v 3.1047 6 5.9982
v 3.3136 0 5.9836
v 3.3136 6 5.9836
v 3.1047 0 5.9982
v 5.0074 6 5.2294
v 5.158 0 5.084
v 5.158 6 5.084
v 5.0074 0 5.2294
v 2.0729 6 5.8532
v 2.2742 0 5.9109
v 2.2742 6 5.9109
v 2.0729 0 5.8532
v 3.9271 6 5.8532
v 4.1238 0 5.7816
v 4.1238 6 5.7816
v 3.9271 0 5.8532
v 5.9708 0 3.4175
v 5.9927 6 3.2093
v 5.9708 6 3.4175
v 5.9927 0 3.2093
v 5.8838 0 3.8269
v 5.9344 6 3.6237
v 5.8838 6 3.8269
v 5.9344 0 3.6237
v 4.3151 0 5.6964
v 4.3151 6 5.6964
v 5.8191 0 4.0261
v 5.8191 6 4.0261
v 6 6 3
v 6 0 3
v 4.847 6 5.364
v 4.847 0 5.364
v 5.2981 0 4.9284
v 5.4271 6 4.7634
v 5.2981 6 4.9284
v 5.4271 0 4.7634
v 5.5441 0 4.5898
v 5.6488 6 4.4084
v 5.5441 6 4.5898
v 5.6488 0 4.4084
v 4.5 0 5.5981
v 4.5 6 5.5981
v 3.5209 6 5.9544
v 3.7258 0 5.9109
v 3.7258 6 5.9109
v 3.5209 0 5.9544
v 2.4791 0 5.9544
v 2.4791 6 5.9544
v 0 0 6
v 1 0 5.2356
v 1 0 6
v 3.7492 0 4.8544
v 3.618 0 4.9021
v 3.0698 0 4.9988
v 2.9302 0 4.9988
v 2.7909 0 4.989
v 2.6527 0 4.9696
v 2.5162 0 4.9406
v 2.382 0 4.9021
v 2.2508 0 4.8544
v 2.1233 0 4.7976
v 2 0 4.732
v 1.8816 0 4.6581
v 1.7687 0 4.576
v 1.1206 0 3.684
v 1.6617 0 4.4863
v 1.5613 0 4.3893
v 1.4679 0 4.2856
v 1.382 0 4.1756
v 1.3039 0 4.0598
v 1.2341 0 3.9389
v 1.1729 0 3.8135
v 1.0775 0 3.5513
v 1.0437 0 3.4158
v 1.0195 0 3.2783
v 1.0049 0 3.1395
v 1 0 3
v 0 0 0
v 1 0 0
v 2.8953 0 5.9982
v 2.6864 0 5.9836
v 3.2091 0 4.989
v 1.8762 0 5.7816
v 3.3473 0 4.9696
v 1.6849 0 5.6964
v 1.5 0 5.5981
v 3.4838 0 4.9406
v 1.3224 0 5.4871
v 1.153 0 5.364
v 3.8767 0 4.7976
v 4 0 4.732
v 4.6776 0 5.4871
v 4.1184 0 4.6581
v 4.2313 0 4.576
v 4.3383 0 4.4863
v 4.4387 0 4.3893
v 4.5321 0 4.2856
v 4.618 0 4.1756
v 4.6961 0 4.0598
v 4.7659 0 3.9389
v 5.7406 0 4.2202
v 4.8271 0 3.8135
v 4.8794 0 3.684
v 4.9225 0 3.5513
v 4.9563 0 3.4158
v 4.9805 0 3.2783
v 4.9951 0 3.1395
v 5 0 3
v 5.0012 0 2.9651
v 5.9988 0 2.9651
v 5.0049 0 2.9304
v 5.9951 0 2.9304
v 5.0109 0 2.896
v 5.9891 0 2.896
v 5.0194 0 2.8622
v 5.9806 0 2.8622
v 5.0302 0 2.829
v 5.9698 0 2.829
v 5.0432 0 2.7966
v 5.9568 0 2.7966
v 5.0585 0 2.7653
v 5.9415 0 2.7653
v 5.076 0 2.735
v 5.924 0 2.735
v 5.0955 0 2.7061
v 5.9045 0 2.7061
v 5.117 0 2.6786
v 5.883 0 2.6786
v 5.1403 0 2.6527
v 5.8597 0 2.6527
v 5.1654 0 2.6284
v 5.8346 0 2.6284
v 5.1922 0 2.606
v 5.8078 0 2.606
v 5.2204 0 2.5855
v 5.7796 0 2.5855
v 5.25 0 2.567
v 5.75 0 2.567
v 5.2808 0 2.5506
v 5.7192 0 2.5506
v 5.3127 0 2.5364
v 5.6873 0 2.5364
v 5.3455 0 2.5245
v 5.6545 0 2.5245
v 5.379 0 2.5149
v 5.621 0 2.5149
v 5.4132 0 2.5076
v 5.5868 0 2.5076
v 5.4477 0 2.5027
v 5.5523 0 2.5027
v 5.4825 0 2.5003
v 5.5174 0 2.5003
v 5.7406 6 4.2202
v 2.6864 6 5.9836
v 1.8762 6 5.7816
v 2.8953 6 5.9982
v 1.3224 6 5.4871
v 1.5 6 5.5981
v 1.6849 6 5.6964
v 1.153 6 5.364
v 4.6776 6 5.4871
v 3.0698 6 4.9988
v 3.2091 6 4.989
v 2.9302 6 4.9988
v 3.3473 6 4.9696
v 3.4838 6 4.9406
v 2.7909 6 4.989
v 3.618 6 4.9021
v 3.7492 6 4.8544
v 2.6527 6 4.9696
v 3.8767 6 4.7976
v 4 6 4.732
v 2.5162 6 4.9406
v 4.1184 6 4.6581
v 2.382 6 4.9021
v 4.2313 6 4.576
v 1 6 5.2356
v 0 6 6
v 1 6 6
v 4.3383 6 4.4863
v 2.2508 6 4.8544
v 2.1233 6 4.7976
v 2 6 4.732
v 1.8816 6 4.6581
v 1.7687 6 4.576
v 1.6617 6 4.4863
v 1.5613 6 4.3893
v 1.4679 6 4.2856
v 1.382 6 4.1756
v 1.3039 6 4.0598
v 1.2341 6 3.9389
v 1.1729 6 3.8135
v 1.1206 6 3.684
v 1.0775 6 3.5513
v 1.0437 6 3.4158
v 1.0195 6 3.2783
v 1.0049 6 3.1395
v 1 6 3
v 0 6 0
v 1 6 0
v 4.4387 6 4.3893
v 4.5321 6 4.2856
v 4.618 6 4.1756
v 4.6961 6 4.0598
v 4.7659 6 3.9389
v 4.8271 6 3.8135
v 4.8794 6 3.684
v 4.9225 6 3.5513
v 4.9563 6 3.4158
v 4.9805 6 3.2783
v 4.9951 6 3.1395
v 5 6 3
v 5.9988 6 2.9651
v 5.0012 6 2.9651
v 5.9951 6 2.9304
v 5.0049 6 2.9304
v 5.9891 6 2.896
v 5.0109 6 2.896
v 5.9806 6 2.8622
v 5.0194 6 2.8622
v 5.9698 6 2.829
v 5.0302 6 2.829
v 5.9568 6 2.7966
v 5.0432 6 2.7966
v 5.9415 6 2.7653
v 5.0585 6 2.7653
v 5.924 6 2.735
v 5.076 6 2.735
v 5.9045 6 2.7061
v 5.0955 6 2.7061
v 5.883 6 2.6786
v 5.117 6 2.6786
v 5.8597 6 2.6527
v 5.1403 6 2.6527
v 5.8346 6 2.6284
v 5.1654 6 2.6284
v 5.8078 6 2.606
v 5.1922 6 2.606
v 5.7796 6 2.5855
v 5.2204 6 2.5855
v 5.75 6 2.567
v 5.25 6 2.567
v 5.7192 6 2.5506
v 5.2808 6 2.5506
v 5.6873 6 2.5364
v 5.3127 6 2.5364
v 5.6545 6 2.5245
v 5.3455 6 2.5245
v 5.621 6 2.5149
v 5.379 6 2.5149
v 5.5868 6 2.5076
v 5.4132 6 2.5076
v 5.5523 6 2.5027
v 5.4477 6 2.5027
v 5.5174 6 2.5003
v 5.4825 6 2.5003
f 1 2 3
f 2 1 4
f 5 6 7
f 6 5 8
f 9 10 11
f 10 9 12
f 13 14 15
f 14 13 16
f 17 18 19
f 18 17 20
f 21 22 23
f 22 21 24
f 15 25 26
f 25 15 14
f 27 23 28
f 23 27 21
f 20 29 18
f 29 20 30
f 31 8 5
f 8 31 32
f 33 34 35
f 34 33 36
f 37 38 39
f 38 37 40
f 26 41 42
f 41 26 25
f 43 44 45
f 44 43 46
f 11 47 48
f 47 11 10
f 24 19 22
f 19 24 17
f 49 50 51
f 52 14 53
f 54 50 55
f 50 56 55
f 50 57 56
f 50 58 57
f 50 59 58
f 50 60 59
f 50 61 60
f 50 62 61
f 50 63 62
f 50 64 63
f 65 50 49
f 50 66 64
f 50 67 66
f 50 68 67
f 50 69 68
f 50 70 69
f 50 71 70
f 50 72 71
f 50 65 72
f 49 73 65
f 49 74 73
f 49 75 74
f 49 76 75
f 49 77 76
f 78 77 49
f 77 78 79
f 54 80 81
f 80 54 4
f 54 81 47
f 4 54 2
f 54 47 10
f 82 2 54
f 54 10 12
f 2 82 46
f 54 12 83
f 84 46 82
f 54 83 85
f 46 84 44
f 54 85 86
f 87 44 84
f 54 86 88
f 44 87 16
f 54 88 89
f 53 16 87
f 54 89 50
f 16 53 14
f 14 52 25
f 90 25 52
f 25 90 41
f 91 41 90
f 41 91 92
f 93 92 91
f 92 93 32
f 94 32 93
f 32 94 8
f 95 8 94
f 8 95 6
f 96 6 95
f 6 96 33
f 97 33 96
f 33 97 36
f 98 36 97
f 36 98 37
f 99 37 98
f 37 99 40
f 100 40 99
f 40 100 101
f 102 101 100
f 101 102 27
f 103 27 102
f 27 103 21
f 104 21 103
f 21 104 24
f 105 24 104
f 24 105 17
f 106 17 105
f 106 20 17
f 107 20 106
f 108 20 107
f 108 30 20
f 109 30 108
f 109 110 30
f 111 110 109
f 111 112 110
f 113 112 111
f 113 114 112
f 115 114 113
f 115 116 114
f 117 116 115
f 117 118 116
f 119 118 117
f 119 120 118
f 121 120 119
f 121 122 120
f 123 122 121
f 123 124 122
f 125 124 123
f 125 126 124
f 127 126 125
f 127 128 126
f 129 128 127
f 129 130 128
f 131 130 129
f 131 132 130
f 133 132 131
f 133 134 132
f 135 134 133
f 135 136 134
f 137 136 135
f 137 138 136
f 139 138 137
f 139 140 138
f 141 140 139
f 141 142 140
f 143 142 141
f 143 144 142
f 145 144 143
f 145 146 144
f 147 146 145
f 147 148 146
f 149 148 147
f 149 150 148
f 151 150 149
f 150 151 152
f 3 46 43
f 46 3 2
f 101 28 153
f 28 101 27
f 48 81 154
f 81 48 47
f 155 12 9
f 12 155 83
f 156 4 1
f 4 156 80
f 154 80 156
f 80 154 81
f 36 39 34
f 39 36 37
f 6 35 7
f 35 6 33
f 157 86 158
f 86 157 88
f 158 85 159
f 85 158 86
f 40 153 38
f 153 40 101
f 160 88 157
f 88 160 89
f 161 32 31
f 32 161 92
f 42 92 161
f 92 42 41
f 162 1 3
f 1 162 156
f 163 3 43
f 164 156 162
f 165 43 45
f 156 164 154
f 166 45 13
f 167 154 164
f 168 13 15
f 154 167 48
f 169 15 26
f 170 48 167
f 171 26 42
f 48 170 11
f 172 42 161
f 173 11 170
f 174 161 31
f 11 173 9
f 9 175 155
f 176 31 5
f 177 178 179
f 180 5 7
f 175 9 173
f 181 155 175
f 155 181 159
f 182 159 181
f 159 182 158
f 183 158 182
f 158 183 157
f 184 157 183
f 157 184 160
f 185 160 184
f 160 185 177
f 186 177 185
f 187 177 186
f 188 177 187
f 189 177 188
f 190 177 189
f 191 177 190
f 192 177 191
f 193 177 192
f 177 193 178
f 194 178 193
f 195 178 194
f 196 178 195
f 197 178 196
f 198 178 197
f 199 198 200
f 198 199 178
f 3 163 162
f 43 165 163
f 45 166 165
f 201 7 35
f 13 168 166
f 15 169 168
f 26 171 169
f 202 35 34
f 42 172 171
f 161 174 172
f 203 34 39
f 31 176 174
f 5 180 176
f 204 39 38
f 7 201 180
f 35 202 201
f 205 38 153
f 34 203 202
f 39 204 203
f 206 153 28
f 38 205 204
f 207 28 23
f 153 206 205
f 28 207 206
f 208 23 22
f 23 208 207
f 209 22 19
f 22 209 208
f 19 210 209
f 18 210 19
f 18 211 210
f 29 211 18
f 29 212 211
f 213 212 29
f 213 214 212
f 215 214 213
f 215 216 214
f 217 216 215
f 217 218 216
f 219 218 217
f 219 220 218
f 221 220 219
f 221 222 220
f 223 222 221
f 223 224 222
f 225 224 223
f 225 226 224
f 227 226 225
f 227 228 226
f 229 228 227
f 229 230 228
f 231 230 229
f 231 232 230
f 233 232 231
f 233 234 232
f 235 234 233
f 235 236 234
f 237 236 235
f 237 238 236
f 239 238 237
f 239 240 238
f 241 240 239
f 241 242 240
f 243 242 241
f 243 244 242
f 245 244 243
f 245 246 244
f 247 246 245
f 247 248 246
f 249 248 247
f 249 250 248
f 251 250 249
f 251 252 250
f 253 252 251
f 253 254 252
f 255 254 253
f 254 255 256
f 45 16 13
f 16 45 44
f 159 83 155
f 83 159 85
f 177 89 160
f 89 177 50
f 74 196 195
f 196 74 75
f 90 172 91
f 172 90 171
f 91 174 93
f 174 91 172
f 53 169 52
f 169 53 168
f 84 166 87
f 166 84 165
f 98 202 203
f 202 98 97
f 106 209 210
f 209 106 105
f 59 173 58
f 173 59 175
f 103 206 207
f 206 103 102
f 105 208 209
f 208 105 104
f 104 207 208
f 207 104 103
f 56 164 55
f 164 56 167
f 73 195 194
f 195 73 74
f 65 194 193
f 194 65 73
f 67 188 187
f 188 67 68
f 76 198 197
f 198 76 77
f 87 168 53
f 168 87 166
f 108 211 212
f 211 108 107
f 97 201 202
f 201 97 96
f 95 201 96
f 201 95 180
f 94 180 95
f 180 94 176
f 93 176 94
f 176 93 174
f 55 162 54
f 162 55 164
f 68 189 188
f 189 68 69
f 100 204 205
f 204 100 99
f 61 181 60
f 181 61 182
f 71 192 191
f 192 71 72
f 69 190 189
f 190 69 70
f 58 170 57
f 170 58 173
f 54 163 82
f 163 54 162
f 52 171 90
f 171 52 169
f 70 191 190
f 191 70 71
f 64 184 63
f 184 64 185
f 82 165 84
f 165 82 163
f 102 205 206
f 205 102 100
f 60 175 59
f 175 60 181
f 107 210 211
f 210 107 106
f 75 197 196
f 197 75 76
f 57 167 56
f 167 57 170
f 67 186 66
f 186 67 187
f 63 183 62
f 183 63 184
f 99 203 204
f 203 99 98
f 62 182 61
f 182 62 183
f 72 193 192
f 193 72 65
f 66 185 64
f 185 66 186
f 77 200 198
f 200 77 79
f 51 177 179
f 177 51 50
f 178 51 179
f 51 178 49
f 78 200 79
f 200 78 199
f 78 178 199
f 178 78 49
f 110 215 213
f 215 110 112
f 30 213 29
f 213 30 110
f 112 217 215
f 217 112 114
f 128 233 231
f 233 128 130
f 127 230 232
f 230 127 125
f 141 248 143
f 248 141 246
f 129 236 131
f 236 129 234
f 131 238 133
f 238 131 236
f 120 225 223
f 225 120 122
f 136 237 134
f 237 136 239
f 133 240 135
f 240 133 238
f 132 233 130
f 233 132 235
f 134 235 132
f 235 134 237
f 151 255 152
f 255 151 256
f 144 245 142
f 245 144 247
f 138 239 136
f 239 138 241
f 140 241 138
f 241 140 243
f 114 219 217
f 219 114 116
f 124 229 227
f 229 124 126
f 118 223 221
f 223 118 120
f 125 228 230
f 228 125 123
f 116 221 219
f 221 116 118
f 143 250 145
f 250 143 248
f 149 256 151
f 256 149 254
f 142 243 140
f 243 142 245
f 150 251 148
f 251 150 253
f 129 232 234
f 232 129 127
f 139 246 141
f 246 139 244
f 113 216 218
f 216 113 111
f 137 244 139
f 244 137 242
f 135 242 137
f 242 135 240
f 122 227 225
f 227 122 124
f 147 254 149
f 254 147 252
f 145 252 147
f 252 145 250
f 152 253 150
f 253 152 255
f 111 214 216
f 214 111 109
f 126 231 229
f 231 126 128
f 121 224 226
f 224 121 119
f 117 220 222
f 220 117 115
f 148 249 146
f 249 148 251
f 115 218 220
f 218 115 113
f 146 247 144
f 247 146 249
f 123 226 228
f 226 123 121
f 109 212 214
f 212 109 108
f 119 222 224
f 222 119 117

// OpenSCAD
$fn = 90;

M = 100;

LED_STRIP_T = 6;
GAP = 5;

BASE_T = 1;
BASE_H = LED_STRIP_T;
BASE_W = BASE_H;

module hook() {
    cube([BASE_T, BASE_W, BASE_H]);
    translate([BASE_H/2,0, BASE_H/2])rotate([-90,0,0])
        difference() {
            cylinder(d=BASE_H, h = BASE_W);
            cylinder(d=BASE_H-2*BASE_T, h = BASE_W);
            translate([-M/2,0,0])cube(M);
        }
    translate([BASE_H-BASE_T/2,0,BASE_H/2])rotate([-90,0,0])
        cylinder(d=BASE_T, h = BASE_W);
}


hook();
